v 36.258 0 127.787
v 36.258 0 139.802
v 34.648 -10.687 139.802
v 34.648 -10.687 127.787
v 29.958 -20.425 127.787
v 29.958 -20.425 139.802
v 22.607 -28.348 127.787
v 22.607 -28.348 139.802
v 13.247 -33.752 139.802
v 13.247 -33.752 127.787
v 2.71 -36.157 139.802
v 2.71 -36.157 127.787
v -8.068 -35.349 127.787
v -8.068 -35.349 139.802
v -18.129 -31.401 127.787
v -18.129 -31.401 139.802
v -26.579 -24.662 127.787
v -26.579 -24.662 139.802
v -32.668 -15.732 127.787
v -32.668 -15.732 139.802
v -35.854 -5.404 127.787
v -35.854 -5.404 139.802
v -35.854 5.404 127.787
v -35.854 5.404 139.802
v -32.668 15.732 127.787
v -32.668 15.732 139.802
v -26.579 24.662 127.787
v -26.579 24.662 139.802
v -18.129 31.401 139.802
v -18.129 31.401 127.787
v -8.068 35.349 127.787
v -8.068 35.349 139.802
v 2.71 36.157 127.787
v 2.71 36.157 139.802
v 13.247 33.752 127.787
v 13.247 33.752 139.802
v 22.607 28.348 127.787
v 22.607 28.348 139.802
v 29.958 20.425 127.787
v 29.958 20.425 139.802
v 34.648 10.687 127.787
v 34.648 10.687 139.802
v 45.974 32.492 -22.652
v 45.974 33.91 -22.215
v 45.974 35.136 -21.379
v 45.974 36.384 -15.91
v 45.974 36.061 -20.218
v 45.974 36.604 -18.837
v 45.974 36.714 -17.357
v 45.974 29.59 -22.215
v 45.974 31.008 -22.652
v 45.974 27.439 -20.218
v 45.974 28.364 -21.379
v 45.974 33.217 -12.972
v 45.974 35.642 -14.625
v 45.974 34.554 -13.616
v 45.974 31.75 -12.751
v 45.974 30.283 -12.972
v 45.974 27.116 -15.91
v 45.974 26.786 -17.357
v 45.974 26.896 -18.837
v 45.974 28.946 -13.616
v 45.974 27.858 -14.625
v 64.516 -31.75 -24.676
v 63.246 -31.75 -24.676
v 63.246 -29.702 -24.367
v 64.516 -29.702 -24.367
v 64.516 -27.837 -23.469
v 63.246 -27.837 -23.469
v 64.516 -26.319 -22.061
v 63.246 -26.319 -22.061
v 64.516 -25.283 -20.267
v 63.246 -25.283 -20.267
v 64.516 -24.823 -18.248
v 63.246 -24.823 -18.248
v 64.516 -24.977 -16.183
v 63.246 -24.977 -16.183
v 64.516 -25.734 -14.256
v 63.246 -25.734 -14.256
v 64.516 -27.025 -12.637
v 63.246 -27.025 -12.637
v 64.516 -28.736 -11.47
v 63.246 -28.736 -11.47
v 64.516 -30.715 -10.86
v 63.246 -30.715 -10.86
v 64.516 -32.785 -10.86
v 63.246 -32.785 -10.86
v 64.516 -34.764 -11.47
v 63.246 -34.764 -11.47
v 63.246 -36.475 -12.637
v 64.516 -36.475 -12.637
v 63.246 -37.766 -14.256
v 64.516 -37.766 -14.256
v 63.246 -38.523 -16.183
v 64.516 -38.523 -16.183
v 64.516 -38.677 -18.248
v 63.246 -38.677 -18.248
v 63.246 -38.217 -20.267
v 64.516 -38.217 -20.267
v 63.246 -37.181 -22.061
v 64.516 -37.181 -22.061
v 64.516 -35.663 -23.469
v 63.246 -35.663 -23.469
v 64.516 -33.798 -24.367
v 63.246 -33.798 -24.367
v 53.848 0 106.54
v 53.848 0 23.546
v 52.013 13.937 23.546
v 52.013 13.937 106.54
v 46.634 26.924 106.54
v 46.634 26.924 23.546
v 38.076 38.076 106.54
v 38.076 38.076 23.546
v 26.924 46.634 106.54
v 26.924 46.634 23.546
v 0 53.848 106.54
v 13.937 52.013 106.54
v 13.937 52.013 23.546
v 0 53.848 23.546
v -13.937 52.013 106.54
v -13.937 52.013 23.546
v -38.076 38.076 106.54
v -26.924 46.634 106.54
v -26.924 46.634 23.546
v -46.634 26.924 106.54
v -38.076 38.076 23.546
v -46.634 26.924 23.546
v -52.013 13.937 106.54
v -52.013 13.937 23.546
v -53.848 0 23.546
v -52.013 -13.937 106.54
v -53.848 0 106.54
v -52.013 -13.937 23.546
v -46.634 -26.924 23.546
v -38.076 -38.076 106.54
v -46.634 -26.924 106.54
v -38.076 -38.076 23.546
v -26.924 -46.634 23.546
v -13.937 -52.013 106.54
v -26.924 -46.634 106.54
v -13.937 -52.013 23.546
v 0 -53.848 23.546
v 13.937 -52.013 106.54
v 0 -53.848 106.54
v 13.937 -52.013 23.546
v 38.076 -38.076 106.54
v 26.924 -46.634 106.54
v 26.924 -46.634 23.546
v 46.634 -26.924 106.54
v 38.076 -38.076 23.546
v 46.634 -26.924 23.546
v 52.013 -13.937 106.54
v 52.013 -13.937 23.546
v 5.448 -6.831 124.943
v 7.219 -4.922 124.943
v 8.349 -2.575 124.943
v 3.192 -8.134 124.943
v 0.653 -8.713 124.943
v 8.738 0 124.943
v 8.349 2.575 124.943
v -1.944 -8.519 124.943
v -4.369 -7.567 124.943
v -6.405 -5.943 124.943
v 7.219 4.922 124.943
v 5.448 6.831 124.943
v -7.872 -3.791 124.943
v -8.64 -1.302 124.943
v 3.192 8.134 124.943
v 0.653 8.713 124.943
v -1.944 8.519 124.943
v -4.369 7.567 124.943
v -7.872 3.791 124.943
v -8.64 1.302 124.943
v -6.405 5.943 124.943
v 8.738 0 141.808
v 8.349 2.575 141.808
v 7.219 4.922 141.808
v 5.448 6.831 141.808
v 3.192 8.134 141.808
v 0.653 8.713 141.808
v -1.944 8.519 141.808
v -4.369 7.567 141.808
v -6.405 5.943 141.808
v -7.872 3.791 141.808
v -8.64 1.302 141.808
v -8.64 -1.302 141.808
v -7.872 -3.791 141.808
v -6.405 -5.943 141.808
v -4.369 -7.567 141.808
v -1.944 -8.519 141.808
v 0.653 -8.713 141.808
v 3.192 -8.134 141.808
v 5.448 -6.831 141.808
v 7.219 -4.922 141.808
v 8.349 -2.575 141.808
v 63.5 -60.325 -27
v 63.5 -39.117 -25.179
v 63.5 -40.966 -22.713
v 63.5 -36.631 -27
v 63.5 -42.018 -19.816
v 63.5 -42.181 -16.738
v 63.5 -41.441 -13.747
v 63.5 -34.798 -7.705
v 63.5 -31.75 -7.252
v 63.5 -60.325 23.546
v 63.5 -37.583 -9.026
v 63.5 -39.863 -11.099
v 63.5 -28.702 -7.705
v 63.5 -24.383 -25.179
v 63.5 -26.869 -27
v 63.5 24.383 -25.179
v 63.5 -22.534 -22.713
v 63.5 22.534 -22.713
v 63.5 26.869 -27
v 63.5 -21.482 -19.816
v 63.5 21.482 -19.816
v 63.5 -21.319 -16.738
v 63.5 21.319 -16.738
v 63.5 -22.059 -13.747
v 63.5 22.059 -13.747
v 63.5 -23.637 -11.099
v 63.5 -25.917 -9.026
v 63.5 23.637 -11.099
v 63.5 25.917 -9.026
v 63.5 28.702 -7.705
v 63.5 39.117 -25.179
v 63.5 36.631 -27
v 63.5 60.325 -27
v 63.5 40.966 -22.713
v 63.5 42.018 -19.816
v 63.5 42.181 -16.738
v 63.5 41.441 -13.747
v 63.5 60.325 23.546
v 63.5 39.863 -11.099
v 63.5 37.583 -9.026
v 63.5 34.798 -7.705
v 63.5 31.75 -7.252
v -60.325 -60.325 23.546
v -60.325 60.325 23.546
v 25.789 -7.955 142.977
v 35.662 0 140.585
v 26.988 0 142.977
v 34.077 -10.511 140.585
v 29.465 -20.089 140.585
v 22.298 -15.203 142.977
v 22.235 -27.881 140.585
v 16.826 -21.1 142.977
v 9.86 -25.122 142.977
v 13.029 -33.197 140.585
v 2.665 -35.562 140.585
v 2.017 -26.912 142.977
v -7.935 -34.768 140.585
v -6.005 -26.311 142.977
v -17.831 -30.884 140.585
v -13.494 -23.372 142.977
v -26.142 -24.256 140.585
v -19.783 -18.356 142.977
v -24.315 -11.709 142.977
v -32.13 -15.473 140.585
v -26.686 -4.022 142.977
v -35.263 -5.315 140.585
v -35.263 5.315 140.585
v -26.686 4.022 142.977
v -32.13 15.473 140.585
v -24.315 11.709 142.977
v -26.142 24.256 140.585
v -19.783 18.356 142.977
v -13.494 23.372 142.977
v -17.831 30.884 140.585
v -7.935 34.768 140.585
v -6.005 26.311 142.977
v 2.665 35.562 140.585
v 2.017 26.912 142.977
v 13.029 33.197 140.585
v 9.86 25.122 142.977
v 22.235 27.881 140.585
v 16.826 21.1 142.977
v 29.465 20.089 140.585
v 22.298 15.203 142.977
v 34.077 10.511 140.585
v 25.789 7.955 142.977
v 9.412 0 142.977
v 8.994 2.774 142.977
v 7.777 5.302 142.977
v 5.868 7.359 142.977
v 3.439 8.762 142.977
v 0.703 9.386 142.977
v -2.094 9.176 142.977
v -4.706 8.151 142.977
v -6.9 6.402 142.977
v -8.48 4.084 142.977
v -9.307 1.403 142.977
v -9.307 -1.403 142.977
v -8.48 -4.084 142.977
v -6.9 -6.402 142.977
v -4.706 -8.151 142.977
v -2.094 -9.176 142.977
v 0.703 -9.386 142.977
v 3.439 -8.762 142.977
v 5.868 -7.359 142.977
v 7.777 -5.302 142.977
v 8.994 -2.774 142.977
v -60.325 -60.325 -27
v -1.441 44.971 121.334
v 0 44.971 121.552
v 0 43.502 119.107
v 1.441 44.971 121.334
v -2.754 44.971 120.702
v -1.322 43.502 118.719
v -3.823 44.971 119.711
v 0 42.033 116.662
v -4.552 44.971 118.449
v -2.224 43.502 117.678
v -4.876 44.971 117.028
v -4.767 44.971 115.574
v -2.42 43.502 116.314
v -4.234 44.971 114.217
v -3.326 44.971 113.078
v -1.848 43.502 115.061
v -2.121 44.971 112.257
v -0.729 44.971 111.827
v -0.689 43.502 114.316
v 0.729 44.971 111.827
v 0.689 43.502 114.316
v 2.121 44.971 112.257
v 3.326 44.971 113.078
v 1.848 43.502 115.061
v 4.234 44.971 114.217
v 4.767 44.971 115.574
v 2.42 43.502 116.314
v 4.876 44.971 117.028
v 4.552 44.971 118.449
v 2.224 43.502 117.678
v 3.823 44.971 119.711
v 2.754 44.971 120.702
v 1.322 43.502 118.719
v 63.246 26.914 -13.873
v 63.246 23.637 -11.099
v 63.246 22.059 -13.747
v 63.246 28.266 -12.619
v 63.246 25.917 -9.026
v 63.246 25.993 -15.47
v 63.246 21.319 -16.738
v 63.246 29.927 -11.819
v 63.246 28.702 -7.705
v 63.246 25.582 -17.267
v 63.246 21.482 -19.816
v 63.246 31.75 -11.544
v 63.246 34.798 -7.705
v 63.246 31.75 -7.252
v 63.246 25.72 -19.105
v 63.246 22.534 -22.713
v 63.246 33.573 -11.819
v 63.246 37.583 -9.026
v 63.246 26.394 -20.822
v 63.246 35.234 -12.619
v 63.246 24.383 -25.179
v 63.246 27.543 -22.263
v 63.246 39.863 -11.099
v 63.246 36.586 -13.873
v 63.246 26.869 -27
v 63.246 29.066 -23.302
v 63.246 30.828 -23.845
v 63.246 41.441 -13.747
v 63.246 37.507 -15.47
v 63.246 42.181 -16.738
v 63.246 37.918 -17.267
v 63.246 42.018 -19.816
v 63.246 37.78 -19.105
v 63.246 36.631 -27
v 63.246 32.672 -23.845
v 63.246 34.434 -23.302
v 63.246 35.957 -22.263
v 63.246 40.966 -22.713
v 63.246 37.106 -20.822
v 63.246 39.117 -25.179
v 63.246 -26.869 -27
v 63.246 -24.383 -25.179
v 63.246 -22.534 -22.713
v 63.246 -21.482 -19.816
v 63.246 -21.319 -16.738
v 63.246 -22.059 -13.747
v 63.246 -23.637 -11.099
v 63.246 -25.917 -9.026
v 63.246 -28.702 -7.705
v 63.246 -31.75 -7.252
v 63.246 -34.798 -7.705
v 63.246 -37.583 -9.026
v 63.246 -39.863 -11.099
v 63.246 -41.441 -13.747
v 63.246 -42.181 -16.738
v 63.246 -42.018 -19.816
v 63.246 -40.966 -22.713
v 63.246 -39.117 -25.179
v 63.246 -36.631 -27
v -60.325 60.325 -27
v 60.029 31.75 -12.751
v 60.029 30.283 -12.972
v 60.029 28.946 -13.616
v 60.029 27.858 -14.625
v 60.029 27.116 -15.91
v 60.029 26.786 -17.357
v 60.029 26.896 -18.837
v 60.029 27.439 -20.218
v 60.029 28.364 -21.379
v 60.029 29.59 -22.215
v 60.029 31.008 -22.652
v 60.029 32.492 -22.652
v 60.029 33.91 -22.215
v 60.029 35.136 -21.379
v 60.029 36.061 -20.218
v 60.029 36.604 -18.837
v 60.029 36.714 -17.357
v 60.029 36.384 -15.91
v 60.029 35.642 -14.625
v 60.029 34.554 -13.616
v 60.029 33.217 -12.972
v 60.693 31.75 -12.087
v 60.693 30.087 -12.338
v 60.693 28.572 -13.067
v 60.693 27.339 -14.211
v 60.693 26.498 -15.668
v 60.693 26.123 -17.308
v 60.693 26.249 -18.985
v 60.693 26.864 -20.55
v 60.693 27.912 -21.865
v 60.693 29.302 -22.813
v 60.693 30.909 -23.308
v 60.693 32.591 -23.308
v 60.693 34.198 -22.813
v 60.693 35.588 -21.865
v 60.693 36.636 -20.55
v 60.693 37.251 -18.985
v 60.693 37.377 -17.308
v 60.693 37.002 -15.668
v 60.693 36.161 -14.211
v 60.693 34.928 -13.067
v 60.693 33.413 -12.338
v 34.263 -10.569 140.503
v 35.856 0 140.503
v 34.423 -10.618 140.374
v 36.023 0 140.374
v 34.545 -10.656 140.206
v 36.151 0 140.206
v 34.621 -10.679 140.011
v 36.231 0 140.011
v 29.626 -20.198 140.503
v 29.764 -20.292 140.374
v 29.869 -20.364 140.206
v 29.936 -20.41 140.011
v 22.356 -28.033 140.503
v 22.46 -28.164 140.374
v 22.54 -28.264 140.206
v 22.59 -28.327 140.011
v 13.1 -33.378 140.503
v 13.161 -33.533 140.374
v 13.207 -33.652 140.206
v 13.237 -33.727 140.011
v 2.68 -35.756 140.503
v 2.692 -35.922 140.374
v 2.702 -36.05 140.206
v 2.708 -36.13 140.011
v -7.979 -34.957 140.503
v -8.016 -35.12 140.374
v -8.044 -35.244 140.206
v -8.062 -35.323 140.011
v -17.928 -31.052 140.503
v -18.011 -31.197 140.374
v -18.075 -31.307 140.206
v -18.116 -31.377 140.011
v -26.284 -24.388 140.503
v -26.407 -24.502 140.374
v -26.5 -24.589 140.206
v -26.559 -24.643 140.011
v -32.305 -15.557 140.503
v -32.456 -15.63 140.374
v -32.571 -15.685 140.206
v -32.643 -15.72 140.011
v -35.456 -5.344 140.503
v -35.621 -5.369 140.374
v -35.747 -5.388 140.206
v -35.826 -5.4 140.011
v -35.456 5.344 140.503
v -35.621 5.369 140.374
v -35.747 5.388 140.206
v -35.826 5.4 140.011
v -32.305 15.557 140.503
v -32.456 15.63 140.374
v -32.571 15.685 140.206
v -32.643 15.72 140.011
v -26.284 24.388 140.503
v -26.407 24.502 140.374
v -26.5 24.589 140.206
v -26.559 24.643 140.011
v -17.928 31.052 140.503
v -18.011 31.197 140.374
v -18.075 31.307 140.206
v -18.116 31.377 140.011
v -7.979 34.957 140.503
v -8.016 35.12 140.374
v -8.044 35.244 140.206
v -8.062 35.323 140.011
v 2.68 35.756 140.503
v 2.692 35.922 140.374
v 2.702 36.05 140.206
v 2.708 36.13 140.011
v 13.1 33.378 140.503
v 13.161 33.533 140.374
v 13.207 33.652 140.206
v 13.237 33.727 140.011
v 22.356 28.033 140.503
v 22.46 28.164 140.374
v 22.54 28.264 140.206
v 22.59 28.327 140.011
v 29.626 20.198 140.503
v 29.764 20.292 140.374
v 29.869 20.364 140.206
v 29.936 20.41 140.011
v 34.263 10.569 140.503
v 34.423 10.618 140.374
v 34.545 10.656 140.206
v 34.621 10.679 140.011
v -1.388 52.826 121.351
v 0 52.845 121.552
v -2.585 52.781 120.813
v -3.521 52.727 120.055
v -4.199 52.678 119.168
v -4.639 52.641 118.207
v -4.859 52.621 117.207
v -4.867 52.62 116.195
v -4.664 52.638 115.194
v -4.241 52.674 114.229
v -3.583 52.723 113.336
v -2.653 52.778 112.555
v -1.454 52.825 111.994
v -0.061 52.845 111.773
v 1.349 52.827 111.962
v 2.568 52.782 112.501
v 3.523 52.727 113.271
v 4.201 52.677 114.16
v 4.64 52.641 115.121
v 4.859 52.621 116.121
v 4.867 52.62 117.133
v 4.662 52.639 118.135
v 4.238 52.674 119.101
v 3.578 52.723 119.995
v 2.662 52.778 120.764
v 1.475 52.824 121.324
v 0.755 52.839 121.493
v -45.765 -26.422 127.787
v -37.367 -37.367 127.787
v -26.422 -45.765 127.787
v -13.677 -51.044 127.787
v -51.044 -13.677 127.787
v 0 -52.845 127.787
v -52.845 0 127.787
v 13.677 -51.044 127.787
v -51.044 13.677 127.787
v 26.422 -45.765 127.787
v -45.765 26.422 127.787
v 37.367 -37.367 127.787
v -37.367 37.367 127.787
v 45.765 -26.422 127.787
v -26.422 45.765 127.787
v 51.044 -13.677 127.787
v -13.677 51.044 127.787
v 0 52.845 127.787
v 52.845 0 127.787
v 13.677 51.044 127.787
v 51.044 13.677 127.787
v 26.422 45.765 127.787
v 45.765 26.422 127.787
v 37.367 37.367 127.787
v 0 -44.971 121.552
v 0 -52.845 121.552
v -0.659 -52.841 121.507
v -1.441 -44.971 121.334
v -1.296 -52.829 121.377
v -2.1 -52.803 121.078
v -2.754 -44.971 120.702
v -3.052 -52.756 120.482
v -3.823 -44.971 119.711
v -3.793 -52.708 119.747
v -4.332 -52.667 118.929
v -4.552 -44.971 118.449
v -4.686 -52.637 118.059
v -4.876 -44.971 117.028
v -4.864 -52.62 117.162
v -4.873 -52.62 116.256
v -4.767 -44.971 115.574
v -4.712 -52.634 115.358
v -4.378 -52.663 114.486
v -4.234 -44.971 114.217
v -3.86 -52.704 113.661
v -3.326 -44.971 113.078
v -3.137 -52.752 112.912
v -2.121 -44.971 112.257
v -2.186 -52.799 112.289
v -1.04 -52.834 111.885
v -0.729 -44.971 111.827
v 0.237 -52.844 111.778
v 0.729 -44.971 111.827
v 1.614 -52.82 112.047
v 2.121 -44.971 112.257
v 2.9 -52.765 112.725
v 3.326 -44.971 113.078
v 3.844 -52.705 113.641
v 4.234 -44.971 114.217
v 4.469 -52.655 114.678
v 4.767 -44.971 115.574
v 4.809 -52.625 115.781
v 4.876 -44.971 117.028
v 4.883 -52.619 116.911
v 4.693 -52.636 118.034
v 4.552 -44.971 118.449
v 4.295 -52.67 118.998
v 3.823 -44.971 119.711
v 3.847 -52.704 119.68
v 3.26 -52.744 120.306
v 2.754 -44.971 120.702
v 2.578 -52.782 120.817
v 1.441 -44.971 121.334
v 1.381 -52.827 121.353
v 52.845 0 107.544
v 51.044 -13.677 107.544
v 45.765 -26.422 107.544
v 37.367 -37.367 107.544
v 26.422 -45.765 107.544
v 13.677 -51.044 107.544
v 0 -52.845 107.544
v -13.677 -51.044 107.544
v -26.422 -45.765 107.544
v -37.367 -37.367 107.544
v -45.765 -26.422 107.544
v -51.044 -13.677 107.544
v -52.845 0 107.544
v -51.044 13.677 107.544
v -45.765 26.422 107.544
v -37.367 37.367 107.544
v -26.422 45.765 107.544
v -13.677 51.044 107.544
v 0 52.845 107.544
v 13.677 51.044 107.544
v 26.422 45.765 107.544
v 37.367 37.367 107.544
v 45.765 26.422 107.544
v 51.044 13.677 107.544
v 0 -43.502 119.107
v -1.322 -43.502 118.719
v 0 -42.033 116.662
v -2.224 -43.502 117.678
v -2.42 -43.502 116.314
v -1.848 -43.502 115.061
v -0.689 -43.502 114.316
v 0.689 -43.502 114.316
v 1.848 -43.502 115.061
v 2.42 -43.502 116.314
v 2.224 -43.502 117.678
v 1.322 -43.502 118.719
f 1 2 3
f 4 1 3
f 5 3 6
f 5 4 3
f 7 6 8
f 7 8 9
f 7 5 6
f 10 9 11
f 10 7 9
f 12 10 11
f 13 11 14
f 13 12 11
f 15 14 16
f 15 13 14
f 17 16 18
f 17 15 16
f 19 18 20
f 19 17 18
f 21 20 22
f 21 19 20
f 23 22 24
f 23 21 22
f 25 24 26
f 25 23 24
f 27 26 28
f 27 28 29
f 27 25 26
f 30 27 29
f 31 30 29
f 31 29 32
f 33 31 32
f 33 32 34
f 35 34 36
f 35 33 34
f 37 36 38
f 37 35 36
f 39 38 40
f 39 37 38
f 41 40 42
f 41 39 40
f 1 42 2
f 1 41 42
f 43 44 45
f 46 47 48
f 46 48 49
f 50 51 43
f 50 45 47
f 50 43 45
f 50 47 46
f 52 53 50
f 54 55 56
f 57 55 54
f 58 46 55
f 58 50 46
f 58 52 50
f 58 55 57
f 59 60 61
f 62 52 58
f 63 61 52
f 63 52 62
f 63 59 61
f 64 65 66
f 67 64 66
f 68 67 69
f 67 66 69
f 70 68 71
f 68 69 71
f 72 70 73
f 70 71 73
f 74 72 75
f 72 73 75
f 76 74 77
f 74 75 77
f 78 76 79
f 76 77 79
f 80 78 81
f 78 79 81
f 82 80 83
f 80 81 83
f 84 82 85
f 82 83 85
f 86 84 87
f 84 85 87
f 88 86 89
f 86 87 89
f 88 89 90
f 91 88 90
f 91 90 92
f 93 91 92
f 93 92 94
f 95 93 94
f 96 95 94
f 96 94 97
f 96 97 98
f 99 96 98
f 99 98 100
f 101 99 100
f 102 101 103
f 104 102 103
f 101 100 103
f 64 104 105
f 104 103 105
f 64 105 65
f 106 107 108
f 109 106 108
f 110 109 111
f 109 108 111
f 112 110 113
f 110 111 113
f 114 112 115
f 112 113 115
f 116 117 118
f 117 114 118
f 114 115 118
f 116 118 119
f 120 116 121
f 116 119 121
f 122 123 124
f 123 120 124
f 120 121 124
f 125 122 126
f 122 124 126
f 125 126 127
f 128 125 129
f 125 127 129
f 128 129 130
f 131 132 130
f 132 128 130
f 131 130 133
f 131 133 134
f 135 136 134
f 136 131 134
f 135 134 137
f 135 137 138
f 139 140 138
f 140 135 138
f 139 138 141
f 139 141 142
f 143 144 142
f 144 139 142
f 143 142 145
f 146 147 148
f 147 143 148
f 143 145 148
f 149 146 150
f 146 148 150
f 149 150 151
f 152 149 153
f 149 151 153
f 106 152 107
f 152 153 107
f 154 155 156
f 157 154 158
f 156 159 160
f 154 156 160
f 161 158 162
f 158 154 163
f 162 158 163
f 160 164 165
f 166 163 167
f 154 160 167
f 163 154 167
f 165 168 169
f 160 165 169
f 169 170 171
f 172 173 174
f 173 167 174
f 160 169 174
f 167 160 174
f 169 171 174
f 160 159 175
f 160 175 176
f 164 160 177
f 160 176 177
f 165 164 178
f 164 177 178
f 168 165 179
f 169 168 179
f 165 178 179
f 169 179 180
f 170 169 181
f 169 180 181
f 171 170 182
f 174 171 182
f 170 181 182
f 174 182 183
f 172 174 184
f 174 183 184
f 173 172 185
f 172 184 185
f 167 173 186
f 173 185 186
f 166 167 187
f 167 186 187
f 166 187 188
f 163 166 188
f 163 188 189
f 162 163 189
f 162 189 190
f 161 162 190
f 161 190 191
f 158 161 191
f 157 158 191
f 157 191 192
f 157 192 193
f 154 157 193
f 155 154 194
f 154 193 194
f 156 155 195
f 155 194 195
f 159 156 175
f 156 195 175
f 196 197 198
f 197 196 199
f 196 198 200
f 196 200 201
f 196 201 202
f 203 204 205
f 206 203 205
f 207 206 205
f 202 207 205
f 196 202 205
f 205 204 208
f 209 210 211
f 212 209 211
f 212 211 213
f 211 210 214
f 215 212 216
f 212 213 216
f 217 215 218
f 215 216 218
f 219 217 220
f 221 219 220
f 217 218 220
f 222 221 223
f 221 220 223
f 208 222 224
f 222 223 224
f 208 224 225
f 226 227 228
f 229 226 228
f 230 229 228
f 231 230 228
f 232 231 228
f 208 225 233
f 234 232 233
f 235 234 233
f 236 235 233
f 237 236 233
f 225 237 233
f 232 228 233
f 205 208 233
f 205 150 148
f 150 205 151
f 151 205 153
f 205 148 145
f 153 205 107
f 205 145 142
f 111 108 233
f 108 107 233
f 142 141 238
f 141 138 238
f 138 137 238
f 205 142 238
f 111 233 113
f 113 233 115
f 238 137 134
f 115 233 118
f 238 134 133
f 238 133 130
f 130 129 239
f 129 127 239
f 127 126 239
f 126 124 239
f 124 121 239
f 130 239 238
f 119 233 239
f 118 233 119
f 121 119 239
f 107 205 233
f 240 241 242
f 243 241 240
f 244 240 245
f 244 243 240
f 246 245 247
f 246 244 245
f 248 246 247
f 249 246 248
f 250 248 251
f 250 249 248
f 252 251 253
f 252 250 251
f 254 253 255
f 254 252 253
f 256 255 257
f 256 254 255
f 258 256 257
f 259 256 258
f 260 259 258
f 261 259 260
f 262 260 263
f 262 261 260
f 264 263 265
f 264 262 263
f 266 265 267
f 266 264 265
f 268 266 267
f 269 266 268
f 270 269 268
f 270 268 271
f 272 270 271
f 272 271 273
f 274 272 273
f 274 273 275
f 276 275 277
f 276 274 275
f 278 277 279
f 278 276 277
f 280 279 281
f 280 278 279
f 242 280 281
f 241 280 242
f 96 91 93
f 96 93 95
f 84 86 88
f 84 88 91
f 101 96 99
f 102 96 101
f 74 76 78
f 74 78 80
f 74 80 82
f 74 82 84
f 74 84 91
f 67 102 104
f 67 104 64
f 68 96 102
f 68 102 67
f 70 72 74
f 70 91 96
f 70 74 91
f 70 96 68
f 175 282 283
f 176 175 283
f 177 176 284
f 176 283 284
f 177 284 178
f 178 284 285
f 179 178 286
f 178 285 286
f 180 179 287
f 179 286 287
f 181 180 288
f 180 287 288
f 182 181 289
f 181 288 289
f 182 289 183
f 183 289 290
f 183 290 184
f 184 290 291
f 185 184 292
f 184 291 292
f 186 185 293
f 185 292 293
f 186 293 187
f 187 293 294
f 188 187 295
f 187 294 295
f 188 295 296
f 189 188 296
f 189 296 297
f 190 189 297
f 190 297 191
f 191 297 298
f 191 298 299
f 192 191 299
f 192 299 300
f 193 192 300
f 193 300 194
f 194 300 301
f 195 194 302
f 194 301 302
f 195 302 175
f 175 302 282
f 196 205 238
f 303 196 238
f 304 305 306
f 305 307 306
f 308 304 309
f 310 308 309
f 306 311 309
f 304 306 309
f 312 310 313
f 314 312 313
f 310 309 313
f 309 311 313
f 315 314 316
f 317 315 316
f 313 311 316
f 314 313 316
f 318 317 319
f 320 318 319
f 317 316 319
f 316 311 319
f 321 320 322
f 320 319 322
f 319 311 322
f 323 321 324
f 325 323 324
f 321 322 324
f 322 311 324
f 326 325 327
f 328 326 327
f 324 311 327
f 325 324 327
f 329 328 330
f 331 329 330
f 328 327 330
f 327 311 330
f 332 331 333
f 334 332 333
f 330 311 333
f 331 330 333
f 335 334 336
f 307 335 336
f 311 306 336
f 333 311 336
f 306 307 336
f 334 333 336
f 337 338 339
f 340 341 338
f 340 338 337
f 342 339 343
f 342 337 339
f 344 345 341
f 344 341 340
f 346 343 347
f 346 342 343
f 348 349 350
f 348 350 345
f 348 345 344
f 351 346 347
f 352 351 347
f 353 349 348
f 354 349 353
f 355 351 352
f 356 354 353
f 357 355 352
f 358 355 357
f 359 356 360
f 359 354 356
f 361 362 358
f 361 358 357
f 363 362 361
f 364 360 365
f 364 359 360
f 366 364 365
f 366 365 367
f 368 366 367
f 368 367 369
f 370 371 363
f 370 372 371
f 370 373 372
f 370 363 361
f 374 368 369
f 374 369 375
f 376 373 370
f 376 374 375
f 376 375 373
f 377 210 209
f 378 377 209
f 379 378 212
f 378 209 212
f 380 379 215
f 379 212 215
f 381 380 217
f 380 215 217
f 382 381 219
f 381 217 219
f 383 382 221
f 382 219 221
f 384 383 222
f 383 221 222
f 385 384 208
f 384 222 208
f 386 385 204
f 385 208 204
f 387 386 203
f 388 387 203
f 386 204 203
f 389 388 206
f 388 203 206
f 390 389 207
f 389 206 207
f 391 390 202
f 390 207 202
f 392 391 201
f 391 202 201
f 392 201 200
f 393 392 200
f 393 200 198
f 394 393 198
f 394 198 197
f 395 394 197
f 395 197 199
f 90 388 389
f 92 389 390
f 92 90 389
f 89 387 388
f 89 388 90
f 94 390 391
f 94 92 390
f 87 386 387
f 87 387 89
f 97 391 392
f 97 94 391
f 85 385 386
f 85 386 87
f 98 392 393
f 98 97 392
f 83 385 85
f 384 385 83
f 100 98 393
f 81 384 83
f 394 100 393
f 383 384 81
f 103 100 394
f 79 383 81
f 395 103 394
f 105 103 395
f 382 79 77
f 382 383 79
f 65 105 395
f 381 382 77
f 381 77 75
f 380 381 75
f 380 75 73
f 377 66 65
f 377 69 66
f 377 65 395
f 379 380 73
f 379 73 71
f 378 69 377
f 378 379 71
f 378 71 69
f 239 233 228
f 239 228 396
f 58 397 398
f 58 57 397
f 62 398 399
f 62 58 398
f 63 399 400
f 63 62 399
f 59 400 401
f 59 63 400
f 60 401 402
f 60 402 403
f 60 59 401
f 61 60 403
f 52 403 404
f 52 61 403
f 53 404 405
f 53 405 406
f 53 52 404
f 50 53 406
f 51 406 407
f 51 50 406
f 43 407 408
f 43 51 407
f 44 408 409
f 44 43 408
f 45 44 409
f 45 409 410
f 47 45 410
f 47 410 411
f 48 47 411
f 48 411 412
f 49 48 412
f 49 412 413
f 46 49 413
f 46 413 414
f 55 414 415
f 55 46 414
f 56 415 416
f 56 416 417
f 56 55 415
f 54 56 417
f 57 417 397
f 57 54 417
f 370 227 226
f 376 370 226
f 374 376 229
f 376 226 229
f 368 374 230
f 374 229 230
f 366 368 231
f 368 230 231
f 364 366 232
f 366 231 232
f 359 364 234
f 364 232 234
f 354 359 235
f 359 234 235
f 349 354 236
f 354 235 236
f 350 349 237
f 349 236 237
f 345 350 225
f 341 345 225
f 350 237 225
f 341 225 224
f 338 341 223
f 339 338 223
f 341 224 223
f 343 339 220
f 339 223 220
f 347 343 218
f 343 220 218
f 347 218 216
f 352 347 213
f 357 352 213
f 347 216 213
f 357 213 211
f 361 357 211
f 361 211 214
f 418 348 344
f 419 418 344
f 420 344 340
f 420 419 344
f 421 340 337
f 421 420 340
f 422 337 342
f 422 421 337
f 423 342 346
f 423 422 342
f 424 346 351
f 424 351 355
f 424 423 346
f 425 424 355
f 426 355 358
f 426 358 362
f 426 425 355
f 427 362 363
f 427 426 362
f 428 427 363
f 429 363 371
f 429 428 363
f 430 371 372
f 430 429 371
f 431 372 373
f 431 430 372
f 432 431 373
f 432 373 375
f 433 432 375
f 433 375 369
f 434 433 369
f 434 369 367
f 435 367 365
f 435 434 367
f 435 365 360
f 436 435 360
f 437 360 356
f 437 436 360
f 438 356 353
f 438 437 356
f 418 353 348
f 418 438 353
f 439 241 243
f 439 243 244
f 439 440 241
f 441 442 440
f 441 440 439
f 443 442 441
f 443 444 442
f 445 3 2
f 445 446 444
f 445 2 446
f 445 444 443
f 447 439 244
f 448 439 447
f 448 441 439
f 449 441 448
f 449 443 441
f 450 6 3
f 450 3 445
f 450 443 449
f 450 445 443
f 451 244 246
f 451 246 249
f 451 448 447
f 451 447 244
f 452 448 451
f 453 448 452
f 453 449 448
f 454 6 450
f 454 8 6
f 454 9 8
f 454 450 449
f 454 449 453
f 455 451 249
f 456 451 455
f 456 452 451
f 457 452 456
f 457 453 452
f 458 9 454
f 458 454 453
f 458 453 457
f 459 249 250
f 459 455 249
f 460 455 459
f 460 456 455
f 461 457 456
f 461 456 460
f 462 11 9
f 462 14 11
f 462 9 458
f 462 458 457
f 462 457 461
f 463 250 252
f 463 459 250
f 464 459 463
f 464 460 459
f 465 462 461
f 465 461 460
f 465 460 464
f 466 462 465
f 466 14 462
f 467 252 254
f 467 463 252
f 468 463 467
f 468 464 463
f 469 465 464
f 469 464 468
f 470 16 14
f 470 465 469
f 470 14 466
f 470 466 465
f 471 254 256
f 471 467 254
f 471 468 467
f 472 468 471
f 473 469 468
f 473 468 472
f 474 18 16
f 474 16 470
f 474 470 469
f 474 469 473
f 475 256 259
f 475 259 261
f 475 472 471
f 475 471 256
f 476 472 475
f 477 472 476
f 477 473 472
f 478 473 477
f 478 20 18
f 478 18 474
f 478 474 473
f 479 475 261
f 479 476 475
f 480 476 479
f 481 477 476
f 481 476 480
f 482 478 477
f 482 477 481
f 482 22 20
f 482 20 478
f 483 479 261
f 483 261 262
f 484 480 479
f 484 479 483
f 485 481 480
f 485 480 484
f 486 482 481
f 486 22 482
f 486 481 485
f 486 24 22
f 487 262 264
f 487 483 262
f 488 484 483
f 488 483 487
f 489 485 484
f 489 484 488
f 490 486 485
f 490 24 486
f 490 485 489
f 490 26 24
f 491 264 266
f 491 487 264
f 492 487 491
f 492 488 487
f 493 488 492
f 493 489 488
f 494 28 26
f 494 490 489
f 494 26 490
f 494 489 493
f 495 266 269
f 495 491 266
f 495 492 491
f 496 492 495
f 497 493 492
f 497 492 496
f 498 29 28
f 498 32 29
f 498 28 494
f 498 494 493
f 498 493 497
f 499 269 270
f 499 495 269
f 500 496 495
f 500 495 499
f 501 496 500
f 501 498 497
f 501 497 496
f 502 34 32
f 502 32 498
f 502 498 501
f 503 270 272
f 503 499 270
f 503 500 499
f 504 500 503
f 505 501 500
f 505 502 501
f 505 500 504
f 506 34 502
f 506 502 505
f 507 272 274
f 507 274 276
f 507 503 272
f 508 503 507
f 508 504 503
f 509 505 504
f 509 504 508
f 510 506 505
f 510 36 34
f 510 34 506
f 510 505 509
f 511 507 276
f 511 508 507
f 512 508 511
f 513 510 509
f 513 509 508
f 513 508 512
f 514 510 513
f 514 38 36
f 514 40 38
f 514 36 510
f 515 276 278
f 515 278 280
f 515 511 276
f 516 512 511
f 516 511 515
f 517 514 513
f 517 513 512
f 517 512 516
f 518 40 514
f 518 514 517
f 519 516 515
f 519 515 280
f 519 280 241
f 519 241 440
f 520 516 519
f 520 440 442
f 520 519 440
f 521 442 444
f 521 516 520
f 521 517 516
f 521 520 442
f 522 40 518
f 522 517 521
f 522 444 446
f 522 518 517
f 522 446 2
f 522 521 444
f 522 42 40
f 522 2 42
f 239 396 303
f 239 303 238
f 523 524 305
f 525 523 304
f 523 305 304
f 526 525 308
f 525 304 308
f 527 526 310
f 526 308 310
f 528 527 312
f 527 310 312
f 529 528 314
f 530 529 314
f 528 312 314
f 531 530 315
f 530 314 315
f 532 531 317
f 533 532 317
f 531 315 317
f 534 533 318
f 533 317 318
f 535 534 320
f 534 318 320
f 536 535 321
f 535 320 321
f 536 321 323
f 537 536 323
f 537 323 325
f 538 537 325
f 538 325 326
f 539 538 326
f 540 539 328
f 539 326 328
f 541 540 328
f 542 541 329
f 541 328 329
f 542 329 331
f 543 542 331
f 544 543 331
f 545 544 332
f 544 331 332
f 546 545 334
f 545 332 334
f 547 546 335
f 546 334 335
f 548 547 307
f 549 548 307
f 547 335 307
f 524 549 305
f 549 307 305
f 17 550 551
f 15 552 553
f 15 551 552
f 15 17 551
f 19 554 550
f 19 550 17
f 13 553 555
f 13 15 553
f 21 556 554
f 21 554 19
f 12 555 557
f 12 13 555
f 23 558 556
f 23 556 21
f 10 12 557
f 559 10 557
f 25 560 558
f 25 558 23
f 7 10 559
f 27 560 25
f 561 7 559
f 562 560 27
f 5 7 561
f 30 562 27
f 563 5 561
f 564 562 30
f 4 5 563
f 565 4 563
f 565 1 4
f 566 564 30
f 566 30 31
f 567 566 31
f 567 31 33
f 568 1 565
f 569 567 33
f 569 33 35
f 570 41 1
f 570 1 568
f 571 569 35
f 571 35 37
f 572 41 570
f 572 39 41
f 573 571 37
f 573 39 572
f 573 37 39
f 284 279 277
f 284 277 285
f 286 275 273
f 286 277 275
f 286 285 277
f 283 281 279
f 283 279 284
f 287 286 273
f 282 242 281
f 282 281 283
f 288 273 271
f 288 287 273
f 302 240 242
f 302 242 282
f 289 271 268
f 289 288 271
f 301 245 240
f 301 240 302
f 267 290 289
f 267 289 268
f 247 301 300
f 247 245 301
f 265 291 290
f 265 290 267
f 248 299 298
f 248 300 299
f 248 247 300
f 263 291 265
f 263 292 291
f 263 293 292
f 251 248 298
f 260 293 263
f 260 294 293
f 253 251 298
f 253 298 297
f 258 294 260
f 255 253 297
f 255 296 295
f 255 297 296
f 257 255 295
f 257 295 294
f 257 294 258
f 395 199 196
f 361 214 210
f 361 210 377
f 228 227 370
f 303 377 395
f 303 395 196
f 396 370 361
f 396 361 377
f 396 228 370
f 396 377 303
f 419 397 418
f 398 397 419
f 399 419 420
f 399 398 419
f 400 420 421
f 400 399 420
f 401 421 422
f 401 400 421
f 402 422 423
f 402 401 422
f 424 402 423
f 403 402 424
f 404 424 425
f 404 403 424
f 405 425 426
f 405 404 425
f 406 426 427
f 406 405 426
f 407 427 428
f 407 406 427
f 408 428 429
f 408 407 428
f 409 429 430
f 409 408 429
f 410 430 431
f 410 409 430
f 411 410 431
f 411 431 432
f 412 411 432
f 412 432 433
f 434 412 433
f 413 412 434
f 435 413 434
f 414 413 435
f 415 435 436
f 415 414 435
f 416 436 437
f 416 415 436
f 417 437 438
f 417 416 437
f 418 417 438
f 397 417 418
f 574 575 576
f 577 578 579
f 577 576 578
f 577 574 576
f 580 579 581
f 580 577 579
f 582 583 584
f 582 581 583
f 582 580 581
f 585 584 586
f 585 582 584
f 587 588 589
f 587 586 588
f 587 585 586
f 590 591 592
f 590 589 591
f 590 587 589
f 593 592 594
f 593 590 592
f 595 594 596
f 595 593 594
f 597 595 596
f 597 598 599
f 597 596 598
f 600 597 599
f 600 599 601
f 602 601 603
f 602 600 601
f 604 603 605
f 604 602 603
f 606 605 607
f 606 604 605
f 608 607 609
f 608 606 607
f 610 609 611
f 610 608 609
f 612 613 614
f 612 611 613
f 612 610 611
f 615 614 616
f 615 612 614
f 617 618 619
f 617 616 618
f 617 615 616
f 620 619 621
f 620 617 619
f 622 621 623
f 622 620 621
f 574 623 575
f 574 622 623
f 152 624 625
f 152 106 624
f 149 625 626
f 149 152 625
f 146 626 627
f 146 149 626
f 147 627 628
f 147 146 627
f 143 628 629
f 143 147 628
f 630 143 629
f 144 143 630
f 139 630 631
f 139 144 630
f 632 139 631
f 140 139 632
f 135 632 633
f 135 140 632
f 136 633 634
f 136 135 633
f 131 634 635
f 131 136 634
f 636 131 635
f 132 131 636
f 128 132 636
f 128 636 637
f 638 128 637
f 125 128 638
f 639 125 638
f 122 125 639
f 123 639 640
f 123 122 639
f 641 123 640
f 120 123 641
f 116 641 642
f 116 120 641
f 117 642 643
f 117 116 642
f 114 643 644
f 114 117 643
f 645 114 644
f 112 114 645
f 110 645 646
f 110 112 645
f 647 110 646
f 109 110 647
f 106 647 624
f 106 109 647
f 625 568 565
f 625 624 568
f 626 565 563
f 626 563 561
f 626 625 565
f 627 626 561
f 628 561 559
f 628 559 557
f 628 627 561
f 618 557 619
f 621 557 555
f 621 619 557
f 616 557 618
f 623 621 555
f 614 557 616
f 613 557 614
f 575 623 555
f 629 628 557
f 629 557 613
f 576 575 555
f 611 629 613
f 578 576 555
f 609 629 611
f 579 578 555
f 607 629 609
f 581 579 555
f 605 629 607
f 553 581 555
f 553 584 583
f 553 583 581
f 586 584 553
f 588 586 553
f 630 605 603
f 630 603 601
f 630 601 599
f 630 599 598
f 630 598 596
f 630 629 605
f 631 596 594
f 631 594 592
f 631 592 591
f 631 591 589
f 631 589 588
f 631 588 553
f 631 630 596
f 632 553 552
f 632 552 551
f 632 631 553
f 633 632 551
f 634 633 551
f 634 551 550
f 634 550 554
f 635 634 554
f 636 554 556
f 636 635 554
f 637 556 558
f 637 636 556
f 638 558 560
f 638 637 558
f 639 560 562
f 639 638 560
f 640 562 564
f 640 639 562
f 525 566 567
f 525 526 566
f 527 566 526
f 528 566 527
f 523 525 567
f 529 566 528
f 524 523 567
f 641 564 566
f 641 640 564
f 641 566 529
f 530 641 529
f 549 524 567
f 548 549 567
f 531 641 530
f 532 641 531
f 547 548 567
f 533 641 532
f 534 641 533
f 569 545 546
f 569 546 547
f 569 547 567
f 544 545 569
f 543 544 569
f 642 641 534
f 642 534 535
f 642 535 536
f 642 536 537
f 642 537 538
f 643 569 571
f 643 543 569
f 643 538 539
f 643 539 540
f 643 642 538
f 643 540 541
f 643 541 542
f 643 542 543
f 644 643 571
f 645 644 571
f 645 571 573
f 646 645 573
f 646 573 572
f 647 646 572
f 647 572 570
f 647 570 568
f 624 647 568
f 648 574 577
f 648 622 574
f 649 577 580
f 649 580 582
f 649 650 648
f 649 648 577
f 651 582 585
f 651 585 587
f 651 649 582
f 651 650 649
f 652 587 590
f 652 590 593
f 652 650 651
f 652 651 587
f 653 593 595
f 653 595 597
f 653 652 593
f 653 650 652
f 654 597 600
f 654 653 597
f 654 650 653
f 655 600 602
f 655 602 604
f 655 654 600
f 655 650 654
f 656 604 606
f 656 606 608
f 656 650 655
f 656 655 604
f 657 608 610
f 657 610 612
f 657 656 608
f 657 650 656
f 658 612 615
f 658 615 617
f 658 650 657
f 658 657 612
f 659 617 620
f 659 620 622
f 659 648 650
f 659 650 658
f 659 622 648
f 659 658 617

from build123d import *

# Parameters (mm, degrees)
SKETCH1_R           = 53.848
EXTRUDE1_DEPTH      = 127.7874
SKETCH13_W          = 15.1892
SKETCH13_H          = 36.2585
S2D0011_W           = 8.7376
S2D0011_H           = 18.034
SKETCH16_W          = 123.825
SKETCH16_H          = 50.546
EXTRUDE2_DEPTH      = 60.325
SKETCH17_R          = 10.4775
CUT_EXTRUDE9_DEPTH  = 0.254
SKETCH18_R          = 10.4775
CUT_EXTRUDE10_DEPTH = 0.254
SKETCH21_R          = 6.9469
EXTRUDE3_DEPTH      = 1.27
CHAMFER1_SIZE       = 1.1684
CHAMFER1_SIZE2      = 0.674576055


with BuildPart() as part:
    # Sketch1 → Extrude1 (new body)
    with BuildSketch(Plane.XY):
        Circle(SKETCH1_R)
    extrude(amount=EXTRUDE1_DEPTH)

    # Sketch10 → Cut-Revolve1 (revolve, cut)
    with BuildSketch(Plane(origin=(0, 0, 0), x_dir=(0, 0, -1), z_dir=(1, 0, 0)), mode=Mode.PRIVATE) as cut_revolve1_sk:
        Polygon((-127.7874, 52.8447), (-107.5436, 52.8447), (-106.5403, 53.848), (-127.7874, 53.848), align=None)
    revolve(cut_revolve1_sk.sketch.rotate(Axis((0, 0, 160.082178917), (0, 0, -1)), 90), axis=Axis((0, 0, 160.082178917), (0, 0, -1)), mode=Mode.SUBTRACT)  # turned: the seam where the file's is

    # Sketch13 → Revolve1 (revolve)
    with BuildSketch(Plane(origin=(0, 0, 0), x_dir=(0, 0, -1), z_dir=(1, 0, 0)), mode=Mode.PRIVATE) as revolve1_sk:
        with Locations((-135.382, 18.12925)):
            Rectangle(SKETCH13_W, SKETCH13_H)
    revolve(revolve1_sk.sketch.rotate(Axis((0, 0, 113.59896), (0, 0, -1)), 90), axis=Axis((0, 0, 113.59896), (0, 0, -1)))  # turned: the seam where the file's is

    # S2D0011 → Cut-Revolve4 (revolve, cut)
    with BuildSketch(Plane(origin=(-6.9342, 0, 112.8014), x_dir=(-1, 0, 0), z_dir=(0, 1, 0)), mode=Mode.PRIVATE) as cut_revolve4_sk:
        with Locations((-2.5654, 21.1582)):
            Rectangle(S2D0011_W, S2D0011_H)
    revolve(cut_revolve4_sk.sketch.rotate(Axis((0, 0, 106.5403), (0, 0, 1)), 180), axis=Axis((0, 0, 106.5403), (0, 0, 1)), mode=Mode.SUBTRACT)  # turned: the seam where the file's is

    # Sketch15 → Cut-Revolve5 (revolve, cut)
    with BuildSketch(Plane(origin=(0, 0, 0), x_dir=(0, 0, -1), z_dir=(1, 0, 0)), mode=Mode.PRIVATE) as cut_revolve5_sk:
        with BuildLine():
            Line((-142.9766, 26.9875), (-140.585166919, 35.66172482))
            ThreePointArc((-140.585166919, 35.66172482), (-140.294072774, 36.092317667), (-139.8016, 36.2585))
            Line((-139.8016, 36.2585), (-142.9766, 36.2585))
            Line((-142.9766, 36.2585), (-142.9766, 26.9875))
        make_face()
    revolve(cut_revolve5_sk.sketch.rotate(Axis((0, 0, 112.96015), (0, 0, -1)), 90), axis=Axis((0, 0, 112.96015), (0, 0, -1)), mode=Mode.SUBTRACT)  # turned: the seam where the file's is

    # Sketch16 → Extrude2 (add, symmetric)
    with BuildSketch(Plane(origin=(0, 0, 0), x_dir=(-1, 0, 0), z_dir=(0, 1, 0))):
        with Locations((-1.5875, -1.7272)):
            Rectangle(SKETCH16_W, SKETCH16_H)
    extrude(amount=EXTRUDE2_DEPTH, both=True)

    # Sketch17 → Cut-Extrude9 (cut)
    with BuildSketch(Plane(origin=(63.5, 0, 0), x_dir=(0, 0, -1), z_dir=(1, 0, 0))):
        with Locations((17.7292, -31.75)):
            Circle(SKETCH17_R)
    extrude(amount=-CUT_EXTRUDE9_DEPTH, mode=Mode.SUBTRACT)

    # Sketch18 → Cut-Extrude10 (cut)
    with BuildSketch(Plane(origin=(63.5, 0, 0), x_dir=(0, 0, -1), z_dir=(1, 0, 0))):
        with Locations((17.7292, 31.75)):
            Circle(SKETCH18_R)
    extrude(amount=-CUT_EXTRUDE10_DEPTH, mode=Mode.SUBTRACT)

    # S2D0001 → Cut-Revolve7 (revolve, cut)
    with BuildSketch(Plane(origin=(52.1462, 23.8125, -17.7292), x_dir=(0, -1, 0), z_dir=(0, 0, 1)), mode=Mode.PRIVATE) as cut_revolve7_sk:
        Polygon((-7.9375, 11.0998), (-1.7526, 11.0998), (-2.295193135, 8.5471), (-2.9591, 7.883193135), (-2.9591, -6.1722), (-7.9375, -6.1722), align=None)
    revolve(cut_revolve7_sk.sketch.rotate(Axis((34.0106, 31.75, -17.7292), (1, 0, 0)), 270), axis=Axis((34.0106, 31.75, -17.7292), (1, 0, 0)), mode=Mode.SUBTRACT)  # turned: the seam where the file's is

    # Sketch21 → Extrude3 (add)
    with BuildSketch(Plane(origin=(63.246, 0, 0), x_dir=(0, 0, -1), z_dir=(1, 0, 0))):
        with Locations((17.7292, -31.75)):
            Circle(SKETCH21_R)
    extrude(amount=EXTRUDE3_DEPTH)

    # Chamfer1
    chamfer1_edges = [part.edges().sort_by_distance(p)[0] for p in [
        (-8.7376, 0, 142.9766),
    ]]
    chamfer1_side = [part.faces().sort_by_distance(p)[0] for p in [
        (-8.7376, 0, 133.9596),
    ]]
    chamfer(chamfer1_edges, length=CHAMFER1_SIZE, length2=CHAMFER1_SIZE2, reference=chamfer1_side[0])

    # Sketch23 → Cut-Revolve8 (revolve, cut)
    with BuildSketch(Plane(origin=(0, 0, 0), x_dir=(0, 0, -1), z_dir=(1, 0, 0))):
        Polygon((-121.5517, 52.8447), (-121.5517, 44.9707), (-116.6622, 42.032792003), (-116.6622, 52.8447), align=None)
    cut_revolve8 = revolve(axis=Axis((0, 62.163785144, 116.6622), (0, -1, 0)), mode=Mode.SUBTRACT)

    # Mirror1: Cut-Revolve8 across plane
    add(cut_revolve8.mirror(Plane.ZX), mode=Mode.SUBTRACT)


solid = part.part
